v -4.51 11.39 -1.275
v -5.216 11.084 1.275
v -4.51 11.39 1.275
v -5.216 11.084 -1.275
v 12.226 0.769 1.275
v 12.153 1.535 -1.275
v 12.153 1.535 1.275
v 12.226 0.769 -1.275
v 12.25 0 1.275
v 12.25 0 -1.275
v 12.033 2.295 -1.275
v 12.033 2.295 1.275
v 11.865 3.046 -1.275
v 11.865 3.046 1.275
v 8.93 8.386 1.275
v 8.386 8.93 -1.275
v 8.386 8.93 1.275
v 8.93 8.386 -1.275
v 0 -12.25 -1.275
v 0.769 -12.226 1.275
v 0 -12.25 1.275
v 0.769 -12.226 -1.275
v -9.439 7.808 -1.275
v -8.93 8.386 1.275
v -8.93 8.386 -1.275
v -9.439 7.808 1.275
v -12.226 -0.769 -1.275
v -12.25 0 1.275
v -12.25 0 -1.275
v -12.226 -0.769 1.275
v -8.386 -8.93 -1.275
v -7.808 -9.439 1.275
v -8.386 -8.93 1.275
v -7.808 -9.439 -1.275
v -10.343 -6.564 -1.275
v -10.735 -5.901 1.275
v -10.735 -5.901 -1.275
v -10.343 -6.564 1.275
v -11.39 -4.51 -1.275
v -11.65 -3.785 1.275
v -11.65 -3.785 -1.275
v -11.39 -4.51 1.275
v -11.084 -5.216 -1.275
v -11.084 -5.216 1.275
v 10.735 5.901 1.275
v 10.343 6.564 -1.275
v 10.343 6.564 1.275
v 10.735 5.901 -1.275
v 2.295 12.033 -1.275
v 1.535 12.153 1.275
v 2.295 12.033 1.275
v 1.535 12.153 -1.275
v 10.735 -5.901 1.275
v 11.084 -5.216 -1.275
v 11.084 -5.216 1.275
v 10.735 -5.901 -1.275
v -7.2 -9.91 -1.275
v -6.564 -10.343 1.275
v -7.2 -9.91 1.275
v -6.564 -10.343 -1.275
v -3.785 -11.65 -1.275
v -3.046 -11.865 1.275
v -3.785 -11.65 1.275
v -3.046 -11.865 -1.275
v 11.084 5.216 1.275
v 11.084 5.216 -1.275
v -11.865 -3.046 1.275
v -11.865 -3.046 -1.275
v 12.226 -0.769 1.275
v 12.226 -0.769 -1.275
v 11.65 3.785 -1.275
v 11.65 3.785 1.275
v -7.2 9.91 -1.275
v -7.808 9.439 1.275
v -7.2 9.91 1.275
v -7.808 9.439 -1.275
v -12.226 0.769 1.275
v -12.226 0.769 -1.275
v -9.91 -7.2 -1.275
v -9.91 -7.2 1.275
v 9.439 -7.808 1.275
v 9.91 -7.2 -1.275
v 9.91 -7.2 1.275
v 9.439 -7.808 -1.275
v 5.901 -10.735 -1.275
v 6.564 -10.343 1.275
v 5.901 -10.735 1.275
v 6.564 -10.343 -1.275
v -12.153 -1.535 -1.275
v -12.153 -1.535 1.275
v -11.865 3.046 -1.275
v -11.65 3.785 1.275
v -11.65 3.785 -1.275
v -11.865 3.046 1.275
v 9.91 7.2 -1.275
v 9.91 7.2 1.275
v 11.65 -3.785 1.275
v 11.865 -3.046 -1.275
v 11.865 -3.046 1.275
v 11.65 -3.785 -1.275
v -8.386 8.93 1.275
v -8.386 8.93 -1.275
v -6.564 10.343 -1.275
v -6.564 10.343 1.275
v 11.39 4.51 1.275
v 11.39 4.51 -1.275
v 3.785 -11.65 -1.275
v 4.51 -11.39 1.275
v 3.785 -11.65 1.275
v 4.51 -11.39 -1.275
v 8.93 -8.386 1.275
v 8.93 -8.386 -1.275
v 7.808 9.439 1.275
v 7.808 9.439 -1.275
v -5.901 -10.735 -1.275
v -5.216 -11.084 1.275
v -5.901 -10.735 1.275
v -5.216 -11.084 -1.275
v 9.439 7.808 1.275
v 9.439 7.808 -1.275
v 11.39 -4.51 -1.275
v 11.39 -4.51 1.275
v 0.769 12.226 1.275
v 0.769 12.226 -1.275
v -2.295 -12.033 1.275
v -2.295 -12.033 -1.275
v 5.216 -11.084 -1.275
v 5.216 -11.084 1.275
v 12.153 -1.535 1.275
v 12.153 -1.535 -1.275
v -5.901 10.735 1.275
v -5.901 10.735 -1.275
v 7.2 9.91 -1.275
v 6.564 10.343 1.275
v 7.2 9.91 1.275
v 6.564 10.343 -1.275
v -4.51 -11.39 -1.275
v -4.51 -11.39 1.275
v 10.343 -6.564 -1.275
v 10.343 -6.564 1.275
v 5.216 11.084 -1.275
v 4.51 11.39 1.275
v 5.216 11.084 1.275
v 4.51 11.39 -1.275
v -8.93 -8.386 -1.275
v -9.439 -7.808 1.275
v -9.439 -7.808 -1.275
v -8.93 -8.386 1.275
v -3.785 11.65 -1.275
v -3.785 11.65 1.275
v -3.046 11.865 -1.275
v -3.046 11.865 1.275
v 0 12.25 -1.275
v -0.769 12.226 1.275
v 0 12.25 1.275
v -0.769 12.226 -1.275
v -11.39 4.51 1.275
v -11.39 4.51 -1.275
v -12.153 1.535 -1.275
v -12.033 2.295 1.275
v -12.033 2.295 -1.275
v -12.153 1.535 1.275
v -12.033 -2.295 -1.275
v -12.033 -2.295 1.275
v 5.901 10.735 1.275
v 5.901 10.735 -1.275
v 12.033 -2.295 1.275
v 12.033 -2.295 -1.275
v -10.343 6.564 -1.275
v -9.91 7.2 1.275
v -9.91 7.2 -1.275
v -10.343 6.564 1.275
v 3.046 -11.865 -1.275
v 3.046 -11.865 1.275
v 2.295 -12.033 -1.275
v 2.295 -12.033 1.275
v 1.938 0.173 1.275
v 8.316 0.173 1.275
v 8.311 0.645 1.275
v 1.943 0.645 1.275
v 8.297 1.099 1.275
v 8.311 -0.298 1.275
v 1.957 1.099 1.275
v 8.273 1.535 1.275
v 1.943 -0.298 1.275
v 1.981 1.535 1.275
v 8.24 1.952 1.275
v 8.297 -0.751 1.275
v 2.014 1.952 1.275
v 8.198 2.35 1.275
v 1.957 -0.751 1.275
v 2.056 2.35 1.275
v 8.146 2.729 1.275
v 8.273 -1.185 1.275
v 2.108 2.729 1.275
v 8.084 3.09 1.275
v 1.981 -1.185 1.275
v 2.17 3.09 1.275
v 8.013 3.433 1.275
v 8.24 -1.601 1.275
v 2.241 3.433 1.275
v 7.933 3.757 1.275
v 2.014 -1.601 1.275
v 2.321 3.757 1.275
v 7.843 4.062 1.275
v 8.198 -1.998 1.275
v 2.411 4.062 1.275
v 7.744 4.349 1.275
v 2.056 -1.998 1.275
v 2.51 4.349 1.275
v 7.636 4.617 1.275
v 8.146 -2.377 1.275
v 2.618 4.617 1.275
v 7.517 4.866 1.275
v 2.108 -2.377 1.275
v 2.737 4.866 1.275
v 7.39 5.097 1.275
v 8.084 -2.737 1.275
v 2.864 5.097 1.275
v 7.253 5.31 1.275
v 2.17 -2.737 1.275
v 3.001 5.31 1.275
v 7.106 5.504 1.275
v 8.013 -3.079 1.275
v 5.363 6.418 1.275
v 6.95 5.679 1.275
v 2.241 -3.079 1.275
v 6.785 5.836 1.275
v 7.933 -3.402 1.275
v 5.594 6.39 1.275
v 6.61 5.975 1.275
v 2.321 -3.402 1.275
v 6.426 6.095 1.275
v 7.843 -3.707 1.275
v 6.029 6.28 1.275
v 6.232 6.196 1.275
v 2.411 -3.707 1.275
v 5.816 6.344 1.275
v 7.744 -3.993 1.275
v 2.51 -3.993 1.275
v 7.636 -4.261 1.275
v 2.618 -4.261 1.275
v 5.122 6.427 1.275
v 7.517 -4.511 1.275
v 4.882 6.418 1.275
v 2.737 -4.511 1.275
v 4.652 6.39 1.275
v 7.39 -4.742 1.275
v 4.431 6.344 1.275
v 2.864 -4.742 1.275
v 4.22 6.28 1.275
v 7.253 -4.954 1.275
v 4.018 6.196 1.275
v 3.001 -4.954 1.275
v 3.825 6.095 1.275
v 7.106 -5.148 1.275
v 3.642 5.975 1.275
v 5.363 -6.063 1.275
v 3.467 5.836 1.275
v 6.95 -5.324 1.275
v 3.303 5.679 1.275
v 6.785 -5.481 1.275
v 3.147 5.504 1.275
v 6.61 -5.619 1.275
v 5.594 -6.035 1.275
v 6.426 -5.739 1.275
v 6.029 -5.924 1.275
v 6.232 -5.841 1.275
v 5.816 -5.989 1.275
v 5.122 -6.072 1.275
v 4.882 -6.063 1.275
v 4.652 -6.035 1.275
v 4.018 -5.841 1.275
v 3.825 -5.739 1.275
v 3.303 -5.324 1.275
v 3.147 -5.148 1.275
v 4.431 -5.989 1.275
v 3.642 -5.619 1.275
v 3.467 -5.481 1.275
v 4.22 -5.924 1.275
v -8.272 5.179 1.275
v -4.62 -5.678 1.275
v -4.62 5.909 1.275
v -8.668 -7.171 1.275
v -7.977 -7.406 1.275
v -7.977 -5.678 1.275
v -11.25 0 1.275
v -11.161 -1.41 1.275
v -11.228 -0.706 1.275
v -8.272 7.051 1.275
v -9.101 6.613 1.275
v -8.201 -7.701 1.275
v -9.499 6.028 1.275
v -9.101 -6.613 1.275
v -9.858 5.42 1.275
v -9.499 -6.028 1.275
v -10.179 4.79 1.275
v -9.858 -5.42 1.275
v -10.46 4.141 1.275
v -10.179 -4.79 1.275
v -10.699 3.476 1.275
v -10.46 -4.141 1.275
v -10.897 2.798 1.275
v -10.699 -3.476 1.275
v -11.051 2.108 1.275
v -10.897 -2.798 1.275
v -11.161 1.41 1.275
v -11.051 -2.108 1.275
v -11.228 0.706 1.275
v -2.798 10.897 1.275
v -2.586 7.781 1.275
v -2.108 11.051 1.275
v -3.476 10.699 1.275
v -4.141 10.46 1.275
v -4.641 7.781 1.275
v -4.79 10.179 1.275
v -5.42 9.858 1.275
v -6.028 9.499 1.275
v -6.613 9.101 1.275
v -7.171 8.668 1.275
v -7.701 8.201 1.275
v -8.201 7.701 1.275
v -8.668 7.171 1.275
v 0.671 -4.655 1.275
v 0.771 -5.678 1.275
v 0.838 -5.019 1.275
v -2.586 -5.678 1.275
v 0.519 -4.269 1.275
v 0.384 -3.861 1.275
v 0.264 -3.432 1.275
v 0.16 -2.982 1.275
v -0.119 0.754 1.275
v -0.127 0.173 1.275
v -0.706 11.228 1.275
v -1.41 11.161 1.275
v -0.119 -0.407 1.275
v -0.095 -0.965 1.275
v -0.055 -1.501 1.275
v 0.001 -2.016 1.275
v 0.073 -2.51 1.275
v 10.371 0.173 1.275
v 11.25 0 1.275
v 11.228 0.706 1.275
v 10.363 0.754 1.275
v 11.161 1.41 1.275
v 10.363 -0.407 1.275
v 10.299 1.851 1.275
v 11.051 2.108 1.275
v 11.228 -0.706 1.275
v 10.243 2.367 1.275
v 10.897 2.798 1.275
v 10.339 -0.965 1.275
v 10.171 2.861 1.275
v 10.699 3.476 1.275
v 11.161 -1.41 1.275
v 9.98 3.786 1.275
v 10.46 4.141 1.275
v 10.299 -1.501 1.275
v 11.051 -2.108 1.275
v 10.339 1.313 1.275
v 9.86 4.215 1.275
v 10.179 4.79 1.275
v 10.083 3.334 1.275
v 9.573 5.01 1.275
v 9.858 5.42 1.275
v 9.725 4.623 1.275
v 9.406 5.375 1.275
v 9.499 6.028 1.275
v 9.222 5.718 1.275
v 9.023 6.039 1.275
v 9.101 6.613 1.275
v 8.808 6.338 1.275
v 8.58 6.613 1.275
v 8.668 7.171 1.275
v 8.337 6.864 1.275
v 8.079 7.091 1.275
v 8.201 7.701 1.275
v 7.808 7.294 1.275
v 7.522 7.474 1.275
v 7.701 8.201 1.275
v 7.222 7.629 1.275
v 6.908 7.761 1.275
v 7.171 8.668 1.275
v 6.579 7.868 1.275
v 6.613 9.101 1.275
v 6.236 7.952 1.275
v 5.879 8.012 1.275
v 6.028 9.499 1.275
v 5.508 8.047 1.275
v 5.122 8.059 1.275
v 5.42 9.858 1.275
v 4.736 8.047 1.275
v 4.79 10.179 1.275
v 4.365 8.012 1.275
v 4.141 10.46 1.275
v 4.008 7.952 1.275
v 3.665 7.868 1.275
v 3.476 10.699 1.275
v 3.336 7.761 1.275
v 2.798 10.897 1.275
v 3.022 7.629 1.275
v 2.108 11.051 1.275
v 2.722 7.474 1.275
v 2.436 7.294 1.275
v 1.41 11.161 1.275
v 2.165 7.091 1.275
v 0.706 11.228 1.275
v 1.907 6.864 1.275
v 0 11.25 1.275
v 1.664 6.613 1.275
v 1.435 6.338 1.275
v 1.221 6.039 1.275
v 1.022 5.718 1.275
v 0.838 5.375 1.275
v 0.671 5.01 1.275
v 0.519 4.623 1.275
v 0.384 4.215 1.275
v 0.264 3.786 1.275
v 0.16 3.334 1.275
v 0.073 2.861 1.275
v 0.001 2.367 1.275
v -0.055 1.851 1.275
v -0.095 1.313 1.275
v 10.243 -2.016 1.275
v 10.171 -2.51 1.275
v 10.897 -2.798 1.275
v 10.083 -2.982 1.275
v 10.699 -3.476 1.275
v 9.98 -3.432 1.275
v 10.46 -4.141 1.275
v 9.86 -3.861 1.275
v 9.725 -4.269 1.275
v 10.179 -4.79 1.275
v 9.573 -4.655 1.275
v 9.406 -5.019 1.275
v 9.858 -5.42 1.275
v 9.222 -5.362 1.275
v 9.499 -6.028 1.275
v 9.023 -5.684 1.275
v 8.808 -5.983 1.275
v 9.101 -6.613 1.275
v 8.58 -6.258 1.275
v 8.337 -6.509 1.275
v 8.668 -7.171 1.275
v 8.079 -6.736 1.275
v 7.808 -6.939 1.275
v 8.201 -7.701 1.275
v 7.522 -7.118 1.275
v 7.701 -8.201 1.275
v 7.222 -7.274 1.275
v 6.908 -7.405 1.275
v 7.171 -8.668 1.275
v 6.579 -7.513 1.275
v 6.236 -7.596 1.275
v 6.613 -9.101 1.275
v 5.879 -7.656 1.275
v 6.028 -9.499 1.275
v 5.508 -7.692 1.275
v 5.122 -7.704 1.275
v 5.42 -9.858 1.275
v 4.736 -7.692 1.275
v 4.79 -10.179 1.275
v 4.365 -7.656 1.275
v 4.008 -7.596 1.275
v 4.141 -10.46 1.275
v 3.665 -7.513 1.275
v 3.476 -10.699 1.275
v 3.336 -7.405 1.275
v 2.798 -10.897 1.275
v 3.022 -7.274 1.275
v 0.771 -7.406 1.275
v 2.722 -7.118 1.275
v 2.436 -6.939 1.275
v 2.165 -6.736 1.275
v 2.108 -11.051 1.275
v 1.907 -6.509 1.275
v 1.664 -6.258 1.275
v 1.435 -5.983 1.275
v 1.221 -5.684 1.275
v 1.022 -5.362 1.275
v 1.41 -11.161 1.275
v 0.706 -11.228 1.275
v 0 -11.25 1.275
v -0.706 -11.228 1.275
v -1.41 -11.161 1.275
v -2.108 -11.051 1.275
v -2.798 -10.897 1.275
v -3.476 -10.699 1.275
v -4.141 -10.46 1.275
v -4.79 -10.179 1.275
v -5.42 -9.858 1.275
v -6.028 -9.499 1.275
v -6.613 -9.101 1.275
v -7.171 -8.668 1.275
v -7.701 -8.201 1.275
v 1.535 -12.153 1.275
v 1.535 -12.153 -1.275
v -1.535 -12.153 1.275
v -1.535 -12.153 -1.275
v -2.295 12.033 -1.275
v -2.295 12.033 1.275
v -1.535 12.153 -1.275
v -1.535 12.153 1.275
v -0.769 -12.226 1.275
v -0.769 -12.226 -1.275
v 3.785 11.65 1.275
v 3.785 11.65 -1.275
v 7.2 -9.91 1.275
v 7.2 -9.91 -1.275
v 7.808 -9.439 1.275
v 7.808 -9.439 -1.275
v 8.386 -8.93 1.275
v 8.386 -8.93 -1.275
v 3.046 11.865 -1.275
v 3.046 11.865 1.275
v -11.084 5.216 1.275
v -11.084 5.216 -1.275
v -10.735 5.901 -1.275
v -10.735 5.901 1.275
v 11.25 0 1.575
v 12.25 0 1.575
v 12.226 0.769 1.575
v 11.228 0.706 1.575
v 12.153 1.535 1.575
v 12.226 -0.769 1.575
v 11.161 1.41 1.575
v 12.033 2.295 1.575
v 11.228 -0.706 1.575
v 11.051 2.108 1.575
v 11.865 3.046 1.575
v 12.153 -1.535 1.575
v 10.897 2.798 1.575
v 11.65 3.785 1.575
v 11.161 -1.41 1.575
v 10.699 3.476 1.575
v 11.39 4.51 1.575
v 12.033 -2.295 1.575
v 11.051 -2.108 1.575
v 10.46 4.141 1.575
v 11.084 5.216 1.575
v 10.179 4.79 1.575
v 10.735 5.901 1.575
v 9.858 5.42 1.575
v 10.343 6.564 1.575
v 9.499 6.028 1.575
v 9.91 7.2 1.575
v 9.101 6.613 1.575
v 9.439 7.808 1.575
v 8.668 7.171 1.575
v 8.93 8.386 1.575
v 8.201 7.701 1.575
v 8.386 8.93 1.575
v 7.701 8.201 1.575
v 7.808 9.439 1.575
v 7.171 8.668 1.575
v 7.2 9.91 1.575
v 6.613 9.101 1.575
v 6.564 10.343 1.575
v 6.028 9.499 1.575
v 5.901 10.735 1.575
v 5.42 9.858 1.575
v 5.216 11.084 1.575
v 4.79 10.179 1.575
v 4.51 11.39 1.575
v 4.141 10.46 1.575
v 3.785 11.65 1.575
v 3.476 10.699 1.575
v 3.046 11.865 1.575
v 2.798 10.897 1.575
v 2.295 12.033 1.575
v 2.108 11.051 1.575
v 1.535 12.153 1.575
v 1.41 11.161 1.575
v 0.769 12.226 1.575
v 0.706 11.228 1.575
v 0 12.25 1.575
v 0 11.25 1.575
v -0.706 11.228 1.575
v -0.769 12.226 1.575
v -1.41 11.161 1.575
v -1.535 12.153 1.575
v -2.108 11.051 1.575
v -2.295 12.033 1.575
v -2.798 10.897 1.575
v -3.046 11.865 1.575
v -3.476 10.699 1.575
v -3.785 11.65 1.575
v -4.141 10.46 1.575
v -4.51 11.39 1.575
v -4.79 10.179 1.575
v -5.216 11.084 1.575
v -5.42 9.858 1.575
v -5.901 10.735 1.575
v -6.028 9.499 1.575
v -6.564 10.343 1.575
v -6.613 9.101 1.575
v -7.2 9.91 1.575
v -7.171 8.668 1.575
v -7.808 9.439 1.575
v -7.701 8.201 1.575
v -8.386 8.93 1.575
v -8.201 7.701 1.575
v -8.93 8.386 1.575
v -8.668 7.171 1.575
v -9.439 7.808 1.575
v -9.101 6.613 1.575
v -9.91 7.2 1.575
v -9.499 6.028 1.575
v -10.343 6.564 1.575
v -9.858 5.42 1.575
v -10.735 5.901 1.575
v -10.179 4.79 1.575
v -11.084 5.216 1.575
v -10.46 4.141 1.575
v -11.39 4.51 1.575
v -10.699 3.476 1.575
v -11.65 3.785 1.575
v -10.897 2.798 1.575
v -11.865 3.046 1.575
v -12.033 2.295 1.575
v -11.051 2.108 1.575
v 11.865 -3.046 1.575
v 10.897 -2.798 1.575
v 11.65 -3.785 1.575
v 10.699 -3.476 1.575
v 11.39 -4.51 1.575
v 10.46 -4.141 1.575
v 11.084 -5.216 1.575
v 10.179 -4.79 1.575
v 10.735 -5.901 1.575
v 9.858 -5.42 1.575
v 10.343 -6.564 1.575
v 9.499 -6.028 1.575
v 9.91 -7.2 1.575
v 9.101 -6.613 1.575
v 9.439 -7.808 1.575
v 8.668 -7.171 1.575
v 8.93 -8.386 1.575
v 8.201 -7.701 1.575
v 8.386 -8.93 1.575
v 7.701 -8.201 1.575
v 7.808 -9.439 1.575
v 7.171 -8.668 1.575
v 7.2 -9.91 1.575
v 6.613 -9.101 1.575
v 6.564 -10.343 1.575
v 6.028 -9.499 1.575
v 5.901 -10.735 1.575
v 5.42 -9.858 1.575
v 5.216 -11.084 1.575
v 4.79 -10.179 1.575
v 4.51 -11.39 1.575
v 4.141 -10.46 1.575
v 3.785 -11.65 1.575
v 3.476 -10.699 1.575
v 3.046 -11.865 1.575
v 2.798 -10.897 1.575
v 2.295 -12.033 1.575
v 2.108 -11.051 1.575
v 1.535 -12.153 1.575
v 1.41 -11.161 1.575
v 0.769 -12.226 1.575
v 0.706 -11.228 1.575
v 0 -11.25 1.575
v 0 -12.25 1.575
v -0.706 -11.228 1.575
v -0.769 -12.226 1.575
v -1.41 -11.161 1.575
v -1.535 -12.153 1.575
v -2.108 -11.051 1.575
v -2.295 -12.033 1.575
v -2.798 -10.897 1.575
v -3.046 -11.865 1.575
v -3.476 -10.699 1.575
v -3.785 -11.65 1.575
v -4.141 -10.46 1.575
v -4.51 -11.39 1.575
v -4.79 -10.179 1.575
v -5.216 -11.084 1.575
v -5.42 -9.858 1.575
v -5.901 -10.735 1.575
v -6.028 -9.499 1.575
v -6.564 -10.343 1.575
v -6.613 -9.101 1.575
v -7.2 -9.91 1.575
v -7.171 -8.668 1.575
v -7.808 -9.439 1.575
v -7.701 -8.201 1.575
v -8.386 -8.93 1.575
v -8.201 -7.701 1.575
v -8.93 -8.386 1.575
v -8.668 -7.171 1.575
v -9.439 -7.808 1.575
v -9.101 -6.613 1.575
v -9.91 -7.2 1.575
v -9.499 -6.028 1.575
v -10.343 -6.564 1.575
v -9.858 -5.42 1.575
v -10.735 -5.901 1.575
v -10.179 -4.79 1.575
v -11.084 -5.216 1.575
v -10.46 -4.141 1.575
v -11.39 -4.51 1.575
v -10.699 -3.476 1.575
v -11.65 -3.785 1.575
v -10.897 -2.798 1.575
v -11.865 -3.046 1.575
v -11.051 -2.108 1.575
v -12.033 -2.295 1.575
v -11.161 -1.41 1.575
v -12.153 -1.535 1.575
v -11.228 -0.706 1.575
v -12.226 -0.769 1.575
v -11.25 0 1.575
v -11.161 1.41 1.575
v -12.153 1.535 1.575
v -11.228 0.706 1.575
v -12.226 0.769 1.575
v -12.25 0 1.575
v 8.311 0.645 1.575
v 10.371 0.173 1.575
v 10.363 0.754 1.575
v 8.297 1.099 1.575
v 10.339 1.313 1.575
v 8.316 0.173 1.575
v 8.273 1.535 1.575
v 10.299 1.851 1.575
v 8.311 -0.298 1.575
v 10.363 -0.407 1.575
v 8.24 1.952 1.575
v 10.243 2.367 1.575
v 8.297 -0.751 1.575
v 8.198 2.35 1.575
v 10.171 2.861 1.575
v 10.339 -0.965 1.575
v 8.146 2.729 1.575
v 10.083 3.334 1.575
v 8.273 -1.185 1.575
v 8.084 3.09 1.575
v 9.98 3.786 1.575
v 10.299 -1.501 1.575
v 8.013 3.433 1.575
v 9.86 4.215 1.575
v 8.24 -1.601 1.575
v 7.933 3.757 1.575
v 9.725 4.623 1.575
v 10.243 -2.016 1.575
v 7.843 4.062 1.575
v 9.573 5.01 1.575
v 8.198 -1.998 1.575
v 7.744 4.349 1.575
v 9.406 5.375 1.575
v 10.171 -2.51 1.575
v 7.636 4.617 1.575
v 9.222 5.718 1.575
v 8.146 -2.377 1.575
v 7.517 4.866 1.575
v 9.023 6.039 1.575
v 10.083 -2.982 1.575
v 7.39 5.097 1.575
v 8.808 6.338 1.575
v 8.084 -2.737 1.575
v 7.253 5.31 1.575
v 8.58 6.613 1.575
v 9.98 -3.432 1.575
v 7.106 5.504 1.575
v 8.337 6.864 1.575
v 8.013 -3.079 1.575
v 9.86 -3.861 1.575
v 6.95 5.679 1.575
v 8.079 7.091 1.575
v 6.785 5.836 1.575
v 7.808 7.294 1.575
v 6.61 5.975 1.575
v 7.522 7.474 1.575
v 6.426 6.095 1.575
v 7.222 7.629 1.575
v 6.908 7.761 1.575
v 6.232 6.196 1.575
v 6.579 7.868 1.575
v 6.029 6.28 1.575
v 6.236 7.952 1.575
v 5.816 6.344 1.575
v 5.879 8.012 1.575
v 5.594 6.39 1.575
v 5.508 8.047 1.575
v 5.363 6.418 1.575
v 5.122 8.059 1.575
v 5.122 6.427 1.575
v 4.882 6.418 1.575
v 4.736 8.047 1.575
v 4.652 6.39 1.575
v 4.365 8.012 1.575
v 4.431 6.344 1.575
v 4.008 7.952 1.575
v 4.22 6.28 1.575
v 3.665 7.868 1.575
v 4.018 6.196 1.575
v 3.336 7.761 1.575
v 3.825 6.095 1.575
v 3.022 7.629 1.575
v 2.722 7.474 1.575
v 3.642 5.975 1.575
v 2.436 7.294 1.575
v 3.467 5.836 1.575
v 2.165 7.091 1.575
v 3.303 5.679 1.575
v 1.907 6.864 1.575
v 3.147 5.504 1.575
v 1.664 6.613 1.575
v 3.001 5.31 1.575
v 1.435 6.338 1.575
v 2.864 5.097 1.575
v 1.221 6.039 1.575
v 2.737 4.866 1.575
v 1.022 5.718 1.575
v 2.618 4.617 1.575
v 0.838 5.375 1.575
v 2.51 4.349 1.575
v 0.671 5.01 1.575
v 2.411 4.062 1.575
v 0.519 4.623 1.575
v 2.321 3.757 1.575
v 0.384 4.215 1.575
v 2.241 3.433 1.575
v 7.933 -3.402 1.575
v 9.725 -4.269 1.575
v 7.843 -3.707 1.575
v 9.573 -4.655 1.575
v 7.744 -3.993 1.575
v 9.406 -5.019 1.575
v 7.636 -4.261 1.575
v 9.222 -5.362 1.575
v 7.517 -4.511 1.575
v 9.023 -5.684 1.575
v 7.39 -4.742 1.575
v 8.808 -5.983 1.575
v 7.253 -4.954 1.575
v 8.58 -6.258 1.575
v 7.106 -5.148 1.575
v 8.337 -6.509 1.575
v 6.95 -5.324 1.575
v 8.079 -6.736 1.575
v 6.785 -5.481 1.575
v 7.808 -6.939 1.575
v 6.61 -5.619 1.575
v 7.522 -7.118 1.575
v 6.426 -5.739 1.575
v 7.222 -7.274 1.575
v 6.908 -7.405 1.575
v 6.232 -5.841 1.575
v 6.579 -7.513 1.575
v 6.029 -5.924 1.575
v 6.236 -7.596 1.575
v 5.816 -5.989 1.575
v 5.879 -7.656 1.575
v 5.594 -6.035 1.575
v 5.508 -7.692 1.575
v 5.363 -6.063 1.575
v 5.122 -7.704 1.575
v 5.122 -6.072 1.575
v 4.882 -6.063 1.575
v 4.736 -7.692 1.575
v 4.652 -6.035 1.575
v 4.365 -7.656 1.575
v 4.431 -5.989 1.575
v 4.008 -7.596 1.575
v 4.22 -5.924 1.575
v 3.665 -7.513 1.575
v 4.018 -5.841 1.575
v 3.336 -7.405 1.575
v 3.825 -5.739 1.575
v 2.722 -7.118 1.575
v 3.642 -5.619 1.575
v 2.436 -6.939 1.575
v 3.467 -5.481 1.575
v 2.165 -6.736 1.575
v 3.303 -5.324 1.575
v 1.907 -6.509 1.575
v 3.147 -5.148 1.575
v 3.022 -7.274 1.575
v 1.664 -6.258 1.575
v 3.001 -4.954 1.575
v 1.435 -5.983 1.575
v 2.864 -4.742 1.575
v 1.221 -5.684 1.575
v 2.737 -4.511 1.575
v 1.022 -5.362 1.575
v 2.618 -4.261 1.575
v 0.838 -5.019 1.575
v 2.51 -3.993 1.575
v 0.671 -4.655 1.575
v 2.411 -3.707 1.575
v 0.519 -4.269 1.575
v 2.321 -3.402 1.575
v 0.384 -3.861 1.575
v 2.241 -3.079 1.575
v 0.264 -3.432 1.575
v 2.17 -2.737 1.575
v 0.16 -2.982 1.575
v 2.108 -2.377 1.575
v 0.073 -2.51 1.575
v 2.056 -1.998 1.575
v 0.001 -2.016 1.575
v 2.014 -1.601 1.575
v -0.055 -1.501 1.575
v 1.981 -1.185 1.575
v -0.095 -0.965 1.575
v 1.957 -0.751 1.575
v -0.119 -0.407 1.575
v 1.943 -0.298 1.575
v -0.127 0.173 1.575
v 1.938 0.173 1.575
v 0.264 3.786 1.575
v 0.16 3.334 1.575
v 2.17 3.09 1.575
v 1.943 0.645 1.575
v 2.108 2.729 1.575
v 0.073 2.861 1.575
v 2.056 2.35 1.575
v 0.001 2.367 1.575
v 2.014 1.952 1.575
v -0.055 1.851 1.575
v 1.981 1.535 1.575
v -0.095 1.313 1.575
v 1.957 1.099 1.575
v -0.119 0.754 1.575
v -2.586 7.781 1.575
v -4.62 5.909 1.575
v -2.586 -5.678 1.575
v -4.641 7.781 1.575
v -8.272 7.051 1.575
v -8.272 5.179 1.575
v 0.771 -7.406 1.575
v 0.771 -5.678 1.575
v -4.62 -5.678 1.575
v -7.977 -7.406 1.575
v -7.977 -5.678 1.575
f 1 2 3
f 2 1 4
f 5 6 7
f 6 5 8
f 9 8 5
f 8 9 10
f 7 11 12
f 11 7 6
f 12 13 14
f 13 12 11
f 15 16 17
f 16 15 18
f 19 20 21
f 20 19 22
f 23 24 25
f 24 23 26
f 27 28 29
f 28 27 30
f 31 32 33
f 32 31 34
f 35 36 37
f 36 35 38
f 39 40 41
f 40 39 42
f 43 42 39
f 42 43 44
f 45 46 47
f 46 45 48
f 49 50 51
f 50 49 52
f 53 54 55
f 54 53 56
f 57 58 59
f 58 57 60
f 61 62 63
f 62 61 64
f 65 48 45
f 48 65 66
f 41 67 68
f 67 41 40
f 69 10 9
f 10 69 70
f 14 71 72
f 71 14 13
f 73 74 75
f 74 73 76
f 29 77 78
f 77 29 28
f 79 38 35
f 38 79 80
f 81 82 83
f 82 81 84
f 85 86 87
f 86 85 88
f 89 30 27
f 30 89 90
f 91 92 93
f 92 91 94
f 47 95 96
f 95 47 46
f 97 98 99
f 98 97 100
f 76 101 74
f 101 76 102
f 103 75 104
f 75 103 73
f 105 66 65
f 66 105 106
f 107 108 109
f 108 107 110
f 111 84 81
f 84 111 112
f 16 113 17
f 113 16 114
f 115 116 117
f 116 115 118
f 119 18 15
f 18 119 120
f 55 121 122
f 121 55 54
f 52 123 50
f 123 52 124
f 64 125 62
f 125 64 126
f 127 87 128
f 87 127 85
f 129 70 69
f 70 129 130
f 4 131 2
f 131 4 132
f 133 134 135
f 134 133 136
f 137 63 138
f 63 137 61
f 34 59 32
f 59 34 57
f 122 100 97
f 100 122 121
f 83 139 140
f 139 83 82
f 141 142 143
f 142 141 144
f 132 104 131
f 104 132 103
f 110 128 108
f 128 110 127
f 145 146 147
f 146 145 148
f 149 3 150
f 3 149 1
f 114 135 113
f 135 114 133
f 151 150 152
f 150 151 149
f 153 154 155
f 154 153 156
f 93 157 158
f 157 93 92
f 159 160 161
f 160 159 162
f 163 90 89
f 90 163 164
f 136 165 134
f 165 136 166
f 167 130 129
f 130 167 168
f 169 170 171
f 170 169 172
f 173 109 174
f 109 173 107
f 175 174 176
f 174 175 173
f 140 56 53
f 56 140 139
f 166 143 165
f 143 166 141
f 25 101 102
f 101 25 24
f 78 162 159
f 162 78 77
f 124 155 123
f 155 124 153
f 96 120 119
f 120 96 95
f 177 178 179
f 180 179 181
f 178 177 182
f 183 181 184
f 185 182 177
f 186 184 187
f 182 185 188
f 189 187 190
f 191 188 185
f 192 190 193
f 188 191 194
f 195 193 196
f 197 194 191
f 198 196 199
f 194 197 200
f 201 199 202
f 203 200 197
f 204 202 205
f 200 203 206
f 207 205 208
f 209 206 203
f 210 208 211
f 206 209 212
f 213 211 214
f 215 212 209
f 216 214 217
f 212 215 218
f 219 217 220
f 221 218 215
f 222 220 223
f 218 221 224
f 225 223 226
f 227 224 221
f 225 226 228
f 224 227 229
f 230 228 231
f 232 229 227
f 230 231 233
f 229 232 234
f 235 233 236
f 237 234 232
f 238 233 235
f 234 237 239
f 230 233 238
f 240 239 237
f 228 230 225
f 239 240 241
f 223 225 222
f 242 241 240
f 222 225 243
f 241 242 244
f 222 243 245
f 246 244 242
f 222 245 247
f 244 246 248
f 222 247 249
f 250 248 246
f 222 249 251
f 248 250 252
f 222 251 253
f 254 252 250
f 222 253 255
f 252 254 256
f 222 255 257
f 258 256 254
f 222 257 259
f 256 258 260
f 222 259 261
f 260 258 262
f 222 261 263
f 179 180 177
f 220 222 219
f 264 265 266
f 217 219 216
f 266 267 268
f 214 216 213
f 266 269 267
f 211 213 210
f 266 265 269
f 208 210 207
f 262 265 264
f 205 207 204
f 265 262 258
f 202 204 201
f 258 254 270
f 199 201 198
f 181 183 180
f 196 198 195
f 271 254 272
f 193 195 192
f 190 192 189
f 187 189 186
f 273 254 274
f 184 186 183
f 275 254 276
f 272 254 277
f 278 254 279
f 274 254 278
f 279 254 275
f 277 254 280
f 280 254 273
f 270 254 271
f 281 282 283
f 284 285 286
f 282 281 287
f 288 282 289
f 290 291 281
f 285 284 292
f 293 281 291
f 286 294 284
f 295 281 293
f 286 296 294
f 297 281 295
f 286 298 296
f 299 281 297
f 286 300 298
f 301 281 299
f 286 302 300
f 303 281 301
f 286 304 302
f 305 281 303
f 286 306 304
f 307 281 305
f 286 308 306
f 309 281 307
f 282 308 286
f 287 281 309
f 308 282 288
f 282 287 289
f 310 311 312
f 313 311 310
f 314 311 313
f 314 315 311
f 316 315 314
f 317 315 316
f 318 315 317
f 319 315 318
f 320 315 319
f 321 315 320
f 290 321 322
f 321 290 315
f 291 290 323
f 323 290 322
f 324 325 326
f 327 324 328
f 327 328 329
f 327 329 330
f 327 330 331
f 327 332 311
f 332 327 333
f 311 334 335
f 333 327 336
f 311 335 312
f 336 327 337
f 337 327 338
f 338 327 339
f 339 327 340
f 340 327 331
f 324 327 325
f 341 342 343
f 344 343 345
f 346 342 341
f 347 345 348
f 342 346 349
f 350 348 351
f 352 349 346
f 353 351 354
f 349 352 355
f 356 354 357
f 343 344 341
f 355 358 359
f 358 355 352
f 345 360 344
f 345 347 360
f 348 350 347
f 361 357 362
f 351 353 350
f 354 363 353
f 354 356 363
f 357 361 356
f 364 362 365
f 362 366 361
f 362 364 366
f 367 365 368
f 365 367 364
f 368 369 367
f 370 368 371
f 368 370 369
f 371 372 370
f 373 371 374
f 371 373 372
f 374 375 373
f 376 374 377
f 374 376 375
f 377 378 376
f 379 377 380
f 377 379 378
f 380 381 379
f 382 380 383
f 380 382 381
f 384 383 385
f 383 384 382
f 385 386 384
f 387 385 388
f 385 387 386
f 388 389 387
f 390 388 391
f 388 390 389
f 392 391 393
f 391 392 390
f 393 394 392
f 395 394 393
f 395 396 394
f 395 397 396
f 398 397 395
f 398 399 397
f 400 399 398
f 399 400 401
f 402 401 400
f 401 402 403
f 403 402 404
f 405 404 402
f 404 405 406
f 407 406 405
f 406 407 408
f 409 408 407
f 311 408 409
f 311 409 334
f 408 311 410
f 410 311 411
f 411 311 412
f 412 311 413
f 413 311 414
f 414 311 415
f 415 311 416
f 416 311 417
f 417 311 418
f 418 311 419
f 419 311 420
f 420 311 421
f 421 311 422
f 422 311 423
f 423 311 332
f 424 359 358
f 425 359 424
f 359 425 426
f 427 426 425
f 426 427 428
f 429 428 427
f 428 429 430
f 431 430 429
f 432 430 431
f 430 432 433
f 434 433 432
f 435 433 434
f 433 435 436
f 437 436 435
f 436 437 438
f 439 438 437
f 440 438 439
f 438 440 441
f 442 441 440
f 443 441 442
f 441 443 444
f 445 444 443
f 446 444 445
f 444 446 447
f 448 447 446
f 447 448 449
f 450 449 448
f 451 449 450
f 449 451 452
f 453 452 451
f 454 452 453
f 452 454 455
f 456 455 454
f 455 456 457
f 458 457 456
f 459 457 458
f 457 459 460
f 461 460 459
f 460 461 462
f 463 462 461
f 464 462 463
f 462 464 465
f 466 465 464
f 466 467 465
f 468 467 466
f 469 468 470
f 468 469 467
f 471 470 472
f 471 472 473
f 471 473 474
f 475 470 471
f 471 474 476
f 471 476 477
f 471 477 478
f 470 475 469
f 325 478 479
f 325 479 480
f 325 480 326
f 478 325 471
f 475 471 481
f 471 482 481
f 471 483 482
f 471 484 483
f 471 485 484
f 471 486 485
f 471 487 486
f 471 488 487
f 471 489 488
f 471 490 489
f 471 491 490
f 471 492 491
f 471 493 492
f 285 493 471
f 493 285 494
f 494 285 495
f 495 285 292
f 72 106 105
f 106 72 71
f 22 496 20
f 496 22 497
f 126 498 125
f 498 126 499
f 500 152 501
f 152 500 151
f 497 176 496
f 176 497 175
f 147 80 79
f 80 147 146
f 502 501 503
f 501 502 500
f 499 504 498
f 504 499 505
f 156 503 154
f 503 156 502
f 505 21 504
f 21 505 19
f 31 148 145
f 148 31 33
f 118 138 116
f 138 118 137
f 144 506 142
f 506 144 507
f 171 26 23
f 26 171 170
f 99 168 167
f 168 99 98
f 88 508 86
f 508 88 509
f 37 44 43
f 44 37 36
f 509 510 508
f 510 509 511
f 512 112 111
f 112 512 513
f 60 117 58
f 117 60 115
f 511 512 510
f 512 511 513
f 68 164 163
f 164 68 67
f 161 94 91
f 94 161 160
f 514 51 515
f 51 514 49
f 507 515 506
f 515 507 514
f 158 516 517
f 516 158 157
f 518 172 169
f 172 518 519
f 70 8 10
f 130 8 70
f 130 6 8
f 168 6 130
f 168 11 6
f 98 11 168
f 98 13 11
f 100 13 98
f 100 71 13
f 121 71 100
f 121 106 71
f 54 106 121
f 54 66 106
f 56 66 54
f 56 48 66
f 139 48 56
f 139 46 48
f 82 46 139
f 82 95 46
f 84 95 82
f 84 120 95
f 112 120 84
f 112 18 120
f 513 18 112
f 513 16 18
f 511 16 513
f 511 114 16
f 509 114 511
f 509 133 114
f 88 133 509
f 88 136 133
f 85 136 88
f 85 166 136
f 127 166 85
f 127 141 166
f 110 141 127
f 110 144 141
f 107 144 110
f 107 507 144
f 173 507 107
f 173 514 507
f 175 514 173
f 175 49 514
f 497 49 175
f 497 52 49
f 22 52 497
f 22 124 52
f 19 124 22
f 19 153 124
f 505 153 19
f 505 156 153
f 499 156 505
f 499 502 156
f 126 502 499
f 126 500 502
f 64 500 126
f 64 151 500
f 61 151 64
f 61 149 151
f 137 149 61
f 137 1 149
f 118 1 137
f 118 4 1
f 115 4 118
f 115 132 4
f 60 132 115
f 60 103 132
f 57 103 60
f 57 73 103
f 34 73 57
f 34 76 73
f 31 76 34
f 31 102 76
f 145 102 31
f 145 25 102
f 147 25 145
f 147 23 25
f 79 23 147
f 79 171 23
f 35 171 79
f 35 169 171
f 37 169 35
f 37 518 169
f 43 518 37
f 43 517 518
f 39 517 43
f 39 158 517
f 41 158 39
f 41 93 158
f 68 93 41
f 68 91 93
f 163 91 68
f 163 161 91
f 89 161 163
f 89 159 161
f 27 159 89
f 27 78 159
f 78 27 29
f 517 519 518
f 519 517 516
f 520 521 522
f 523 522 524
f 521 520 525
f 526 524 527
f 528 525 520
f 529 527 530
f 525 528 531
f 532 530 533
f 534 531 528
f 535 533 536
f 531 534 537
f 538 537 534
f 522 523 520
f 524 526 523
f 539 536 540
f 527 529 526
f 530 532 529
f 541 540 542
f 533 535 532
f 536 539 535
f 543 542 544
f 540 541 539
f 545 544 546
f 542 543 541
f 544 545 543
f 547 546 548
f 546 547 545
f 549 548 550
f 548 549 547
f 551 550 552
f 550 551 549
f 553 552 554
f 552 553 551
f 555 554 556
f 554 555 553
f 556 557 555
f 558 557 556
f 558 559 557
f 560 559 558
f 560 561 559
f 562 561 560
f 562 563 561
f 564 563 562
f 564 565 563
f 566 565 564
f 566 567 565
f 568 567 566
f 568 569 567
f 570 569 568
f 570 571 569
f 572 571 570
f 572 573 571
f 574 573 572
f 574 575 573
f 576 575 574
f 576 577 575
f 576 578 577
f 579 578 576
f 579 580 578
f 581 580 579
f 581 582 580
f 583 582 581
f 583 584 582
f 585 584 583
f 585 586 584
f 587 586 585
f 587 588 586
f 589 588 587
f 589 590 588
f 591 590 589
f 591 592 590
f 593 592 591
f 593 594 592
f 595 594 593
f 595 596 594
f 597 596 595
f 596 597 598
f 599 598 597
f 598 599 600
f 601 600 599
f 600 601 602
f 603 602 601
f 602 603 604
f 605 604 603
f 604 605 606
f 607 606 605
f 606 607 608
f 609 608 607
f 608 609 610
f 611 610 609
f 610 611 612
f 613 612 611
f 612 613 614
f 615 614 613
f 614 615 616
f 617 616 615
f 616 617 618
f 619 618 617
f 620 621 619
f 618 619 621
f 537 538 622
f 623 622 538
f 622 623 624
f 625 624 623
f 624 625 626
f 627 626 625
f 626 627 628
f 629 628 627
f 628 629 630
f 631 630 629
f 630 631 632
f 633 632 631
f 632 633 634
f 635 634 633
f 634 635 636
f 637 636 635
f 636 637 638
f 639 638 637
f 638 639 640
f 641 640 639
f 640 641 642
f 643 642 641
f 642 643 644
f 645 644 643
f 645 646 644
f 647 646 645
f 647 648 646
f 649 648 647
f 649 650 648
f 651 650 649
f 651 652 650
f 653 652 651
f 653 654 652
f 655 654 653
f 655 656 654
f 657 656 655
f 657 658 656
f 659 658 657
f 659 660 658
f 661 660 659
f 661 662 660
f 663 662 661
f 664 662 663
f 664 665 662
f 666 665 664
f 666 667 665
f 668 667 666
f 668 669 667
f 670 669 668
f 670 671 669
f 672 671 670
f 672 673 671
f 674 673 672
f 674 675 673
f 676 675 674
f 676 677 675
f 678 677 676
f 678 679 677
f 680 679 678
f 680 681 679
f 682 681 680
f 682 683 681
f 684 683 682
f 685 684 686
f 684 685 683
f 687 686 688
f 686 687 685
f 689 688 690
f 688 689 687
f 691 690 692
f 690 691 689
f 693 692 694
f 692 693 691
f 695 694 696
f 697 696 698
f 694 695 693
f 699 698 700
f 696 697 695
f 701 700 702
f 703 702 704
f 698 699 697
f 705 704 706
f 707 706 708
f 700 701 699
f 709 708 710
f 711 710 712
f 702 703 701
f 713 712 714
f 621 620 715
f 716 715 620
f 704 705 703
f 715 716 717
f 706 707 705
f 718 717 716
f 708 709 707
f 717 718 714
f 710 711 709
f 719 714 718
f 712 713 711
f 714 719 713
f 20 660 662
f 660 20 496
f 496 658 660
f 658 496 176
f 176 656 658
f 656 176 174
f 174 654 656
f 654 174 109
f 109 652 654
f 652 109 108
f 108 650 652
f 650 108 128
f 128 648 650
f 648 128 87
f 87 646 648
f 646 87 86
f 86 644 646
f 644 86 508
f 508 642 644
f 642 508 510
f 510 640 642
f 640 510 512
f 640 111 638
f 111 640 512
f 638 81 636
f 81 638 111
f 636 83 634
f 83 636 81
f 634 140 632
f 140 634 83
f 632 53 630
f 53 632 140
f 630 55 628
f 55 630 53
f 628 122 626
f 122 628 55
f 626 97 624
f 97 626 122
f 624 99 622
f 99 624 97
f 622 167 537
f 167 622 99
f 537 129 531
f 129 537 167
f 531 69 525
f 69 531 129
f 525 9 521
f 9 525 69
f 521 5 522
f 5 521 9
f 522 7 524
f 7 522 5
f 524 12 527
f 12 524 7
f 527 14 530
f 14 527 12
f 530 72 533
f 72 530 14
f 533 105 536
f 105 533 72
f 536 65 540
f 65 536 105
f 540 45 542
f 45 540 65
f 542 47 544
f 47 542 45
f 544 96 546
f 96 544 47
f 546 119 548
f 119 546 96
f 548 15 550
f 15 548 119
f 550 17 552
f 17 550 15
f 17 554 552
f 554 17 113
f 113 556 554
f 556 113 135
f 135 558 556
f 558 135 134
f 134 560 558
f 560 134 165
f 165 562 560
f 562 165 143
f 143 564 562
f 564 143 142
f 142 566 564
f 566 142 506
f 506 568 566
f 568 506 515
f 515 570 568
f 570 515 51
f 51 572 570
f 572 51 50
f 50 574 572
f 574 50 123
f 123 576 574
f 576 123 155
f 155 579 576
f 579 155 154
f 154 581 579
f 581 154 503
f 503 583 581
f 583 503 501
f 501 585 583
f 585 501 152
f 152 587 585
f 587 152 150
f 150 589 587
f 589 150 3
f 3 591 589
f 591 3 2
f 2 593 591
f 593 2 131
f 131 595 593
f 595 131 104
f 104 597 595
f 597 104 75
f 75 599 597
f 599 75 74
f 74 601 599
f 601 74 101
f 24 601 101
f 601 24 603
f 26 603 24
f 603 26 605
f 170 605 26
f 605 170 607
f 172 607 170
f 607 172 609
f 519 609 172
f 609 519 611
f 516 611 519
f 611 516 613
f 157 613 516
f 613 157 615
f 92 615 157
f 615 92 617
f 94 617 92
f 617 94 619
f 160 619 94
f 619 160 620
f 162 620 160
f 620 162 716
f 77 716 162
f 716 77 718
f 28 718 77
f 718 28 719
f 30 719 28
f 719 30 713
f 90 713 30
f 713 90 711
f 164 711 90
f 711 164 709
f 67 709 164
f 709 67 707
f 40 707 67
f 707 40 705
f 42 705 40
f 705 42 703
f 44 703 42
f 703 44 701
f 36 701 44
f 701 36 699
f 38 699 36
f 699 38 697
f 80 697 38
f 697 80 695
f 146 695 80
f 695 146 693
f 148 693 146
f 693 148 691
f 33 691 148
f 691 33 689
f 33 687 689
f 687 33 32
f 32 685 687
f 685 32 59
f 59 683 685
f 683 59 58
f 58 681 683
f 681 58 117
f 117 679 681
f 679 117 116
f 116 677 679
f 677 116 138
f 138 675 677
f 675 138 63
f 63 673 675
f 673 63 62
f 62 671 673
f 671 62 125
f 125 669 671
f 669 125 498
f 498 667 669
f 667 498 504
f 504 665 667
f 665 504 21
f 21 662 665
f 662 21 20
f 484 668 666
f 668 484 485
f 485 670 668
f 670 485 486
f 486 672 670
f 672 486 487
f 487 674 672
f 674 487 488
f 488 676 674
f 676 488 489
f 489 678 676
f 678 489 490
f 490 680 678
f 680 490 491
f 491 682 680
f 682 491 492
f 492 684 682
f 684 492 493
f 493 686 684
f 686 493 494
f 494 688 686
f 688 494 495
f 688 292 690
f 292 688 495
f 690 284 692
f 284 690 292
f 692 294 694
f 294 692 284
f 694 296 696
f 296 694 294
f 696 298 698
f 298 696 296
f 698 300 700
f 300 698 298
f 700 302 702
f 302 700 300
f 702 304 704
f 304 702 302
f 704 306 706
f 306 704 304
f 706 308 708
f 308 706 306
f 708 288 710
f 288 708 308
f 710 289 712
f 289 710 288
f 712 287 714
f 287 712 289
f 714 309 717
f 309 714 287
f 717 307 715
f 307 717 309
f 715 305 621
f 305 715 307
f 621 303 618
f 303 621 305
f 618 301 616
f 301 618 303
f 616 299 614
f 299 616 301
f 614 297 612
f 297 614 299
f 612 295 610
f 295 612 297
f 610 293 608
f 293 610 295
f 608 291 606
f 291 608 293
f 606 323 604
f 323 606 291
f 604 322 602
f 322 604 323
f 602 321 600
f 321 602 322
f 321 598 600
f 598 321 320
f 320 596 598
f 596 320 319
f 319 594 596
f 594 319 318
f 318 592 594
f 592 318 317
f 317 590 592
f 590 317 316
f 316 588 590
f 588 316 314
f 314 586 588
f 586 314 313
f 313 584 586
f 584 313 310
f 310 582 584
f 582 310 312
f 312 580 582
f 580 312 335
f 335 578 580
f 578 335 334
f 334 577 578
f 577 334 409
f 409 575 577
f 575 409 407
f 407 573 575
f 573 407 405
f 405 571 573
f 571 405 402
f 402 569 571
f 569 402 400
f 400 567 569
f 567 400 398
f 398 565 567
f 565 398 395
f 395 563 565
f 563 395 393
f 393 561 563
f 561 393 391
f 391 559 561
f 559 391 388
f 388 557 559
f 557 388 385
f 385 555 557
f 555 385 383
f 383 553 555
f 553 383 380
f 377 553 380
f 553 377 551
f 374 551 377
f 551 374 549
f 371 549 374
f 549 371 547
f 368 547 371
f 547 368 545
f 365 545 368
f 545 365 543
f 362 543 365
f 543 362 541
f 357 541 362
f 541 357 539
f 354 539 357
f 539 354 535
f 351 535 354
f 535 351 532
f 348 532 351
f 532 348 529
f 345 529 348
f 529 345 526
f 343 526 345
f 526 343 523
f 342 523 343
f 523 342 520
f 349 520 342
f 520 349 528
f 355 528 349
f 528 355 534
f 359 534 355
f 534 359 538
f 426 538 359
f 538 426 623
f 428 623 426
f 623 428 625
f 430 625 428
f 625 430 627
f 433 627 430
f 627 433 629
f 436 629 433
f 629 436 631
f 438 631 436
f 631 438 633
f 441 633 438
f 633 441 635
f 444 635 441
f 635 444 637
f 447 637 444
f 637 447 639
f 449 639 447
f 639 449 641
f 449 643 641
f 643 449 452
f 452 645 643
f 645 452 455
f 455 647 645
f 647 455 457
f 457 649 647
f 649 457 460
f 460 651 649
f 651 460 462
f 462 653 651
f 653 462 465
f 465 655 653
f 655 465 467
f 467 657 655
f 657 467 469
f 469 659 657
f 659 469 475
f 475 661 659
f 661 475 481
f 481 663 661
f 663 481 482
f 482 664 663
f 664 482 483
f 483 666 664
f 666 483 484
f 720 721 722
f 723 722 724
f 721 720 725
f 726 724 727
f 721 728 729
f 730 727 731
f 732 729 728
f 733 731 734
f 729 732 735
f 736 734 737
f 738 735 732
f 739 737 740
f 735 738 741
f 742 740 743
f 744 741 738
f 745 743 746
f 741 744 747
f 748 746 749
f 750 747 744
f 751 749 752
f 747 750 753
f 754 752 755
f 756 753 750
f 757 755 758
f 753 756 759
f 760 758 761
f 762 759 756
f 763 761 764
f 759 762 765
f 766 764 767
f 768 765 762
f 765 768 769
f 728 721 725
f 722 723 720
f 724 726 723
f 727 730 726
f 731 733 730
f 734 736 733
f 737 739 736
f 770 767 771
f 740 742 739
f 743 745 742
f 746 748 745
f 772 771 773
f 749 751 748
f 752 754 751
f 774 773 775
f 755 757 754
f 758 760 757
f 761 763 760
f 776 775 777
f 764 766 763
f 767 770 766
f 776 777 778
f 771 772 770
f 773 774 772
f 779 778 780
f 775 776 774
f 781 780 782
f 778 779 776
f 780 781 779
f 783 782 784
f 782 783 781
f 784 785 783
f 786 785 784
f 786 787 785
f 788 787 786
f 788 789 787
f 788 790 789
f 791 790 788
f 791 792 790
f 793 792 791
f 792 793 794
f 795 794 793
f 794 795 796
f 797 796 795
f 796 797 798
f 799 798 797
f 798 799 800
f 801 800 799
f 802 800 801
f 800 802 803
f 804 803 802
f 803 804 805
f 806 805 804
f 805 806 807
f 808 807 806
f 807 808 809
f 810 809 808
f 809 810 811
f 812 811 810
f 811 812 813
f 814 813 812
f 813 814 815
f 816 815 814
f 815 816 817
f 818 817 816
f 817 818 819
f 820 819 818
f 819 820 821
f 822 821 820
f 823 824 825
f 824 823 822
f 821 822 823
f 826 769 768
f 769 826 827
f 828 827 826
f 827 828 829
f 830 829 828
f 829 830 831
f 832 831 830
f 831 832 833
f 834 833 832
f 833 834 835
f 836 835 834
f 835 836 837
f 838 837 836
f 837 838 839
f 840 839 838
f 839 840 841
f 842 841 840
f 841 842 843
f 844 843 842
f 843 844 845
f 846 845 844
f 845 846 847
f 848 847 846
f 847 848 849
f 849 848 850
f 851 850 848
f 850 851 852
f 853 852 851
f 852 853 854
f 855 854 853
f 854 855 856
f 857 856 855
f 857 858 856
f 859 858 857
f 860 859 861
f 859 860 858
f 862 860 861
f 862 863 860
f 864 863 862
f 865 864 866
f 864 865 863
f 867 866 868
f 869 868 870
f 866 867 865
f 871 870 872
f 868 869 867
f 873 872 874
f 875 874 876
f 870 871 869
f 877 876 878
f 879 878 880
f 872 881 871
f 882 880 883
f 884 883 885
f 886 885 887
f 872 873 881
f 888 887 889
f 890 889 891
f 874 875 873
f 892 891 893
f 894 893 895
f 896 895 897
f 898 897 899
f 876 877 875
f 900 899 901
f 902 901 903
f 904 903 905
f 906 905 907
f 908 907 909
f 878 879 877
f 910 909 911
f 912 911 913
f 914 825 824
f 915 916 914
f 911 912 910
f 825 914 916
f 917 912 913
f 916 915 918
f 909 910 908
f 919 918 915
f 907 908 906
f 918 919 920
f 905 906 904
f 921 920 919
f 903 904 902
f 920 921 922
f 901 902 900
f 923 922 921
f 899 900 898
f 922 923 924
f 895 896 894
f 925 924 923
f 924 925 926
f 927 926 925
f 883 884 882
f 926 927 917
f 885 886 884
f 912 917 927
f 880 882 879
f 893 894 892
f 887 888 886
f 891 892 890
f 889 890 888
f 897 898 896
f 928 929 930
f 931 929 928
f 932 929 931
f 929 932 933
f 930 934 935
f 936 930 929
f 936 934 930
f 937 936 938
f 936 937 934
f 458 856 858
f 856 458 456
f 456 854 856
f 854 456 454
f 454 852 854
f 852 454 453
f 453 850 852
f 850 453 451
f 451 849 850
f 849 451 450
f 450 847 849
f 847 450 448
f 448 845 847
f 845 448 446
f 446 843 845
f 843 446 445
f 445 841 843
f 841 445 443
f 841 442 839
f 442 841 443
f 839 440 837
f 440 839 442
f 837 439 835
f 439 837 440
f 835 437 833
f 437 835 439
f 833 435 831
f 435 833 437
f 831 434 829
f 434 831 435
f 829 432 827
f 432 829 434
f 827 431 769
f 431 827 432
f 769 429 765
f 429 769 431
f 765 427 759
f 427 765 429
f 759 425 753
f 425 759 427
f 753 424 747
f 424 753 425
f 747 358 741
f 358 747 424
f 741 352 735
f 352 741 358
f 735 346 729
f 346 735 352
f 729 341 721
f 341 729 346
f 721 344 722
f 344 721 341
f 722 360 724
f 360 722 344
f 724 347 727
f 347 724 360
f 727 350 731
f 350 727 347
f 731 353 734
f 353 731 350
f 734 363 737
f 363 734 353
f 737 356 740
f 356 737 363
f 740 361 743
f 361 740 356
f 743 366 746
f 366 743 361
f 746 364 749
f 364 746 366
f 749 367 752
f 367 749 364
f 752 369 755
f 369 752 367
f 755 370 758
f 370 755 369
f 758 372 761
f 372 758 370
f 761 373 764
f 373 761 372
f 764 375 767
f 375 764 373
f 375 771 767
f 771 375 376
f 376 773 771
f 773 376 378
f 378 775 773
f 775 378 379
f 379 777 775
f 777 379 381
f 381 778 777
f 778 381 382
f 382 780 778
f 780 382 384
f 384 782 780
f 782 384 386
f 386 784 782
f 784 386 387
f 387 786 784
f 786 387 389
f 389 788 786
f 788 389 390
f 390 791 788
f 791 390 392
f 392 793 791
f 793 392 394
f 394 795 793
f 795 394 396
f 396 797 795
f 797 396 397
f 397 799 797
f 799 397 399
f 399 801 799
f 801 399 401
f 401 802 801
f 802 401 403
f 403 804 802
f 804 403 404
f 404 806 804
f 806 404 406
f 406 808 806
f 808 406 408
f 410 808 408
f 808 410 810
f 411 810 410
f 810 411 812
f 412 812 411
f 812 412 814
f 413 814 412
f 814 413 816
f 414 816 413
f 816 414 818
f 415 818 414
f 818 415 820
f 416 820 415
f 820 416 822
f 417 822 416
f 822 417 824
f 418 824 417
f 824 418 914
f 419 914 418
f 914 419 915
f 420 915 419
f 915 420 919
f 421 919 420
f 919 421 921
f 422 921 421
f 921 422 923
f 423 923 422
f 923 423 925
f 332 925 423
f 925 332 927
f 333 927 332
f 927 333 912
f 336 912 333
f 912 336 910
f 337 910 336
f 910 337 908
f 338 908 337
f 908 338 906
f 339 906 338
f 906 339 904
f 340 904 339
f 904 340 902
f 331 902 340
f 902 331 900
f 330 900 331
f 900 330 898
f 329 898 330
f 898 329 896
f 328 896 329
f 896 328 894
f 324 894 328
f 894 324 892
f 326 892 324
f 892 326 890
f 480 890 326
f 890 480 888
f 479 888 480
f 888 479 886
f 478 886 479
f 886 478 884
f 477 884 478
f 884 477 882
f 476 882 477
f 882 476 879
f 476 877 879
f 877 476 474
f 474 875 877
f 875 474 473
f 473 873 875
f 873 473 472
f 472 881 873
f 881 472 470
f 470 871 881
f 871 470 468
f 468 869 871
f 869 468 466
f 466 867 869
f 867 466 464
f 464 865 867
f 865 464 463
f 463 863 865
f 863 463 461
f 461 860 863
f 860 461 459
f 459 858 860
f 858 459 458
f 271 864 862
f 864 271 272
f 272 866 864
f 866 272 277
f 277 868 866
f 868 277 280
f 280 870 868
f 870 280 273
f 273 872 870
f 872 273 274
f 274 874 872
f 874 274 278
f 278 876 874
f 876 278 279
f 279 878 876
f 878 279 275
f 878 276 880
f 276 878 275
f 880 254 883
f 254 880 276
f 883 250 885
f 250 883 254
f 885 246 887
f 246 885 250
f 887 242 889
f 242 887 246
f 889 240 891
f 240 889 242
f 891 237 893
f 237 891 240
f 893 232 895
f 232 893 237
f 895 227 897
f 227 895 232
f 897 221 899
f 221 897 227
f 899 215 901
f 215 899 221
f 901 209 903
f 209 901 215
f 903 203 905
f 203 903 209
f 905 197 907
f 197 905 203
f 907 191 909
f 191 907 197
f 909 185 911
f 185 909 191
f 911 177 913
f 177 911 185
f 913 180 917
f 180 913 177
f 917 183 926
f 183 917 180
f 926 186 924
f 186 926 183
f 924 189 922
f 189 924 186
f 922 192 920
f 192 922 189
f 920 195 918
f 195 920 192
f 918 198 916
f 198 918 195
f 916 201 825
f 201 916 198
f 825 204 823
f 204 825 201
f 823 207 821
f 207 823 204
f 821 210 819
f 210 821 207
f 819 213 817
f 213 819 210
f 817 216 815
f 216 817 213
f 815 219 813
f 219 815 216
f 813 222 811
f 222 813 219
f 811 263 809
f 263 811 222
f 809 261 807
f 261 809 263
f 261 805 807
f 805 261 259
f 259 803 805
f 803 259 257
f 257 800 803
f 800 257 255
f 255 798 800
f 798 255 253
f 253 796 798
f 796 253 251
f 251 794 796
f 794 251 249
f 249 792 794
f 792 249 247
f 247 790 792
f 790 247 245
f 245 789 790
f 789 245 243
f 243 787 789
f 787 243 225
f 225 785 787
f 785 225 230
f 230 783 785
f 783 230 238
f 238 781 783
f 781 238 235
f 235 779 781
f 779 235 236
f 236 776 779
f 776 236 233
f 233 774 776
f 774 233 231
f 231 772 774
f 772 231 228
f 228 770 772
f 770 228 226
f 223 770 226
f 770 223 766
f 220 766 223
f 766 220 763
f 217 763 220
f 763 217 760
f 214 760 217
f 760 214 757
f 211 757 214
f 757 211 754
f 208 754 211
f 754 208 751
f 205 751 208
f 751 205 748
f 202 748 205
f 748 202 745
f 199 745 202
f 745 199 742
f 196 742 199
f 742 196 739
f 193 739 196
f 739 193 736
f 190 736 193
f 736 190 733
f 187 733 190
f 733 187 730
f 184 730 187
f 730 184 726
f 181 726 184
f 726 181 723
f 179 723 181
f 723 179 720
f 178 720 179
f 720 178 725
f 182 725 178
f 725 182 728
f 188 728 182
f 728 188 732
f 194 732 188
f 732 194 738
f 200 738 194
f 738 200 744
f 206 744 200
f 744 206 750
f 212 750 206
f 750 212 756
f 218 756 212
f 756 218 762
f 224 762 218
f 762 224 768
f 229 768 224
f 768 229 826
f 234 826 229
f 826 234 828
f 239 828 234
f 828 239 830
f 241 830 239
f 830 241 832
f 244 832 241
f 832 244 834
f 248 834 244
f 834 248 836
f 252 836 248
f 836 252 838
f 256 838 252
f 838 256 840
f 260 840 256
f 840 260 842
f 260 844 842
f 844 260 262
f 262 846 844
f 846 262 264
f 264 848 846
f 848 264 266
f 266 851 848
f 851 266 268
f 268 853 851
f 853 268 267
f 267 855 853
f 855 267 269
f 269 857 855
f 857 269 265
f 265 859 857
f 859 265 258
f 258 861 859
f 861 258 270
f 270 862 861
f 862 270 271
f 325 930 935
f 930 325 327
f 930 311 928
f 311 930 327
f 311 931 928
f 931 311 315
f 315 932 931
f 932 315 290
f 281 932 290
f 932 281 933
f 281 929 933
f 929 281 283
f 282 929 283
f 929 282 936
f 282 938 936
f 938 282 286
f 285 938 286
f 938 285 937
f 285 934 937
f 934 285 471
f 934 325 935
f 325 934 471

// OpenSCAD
// 10 CZK coin model

// ===== DIMENSIONS =====
COIN_DIAMETER = 24.5;  // mm
COIN_THICKNESS = 2.55; // mm
EDGE_WIDTH = 1;        // mm (difference between outer and inner diameter)

// ===== TEXT =====
TEXT_SIZE = 15;        // mm
TEXT_HEIGHT = 0.3;     // mm
TEXT_FONT = "Arial Rounded MT Bold";
TEXT_SPACING = 0.7;    // spacing between characters (1.0 is normal)
TEXT_OFFSET = -1.5;    // mm offset for better centering

// ===== RENDERING =====
$fn = 100; // High resolution for smooth edges

module coin() {
    // Main coin body
    cylinder(h = COIN_THICKNESS, d = COIN_DIAMETER, center = true);
    
    // Raised edge
    translate([0, 0, COIN_THICKNESS/2])
    linear_extrude(height = TEXT_HEIGHT)
    difference() {
        circle(d = COIN_DIAMETER);
        circle(d = COIN_DIAMETER - (EDGE_WIDTH * 2));
    }
    
    // Add the number 10
    translate([TEXT_OFFSET, 0, COIN_THICKNESS/2])
    linear_extrude(height = TEXT_HEIGHT)
    text("10", size = TEXT_SIZE, font = TEXT_FONT, spacing = TEXT_SPACING, halign = "center", valign = "center");
}

// Render the coin
coin(); 
